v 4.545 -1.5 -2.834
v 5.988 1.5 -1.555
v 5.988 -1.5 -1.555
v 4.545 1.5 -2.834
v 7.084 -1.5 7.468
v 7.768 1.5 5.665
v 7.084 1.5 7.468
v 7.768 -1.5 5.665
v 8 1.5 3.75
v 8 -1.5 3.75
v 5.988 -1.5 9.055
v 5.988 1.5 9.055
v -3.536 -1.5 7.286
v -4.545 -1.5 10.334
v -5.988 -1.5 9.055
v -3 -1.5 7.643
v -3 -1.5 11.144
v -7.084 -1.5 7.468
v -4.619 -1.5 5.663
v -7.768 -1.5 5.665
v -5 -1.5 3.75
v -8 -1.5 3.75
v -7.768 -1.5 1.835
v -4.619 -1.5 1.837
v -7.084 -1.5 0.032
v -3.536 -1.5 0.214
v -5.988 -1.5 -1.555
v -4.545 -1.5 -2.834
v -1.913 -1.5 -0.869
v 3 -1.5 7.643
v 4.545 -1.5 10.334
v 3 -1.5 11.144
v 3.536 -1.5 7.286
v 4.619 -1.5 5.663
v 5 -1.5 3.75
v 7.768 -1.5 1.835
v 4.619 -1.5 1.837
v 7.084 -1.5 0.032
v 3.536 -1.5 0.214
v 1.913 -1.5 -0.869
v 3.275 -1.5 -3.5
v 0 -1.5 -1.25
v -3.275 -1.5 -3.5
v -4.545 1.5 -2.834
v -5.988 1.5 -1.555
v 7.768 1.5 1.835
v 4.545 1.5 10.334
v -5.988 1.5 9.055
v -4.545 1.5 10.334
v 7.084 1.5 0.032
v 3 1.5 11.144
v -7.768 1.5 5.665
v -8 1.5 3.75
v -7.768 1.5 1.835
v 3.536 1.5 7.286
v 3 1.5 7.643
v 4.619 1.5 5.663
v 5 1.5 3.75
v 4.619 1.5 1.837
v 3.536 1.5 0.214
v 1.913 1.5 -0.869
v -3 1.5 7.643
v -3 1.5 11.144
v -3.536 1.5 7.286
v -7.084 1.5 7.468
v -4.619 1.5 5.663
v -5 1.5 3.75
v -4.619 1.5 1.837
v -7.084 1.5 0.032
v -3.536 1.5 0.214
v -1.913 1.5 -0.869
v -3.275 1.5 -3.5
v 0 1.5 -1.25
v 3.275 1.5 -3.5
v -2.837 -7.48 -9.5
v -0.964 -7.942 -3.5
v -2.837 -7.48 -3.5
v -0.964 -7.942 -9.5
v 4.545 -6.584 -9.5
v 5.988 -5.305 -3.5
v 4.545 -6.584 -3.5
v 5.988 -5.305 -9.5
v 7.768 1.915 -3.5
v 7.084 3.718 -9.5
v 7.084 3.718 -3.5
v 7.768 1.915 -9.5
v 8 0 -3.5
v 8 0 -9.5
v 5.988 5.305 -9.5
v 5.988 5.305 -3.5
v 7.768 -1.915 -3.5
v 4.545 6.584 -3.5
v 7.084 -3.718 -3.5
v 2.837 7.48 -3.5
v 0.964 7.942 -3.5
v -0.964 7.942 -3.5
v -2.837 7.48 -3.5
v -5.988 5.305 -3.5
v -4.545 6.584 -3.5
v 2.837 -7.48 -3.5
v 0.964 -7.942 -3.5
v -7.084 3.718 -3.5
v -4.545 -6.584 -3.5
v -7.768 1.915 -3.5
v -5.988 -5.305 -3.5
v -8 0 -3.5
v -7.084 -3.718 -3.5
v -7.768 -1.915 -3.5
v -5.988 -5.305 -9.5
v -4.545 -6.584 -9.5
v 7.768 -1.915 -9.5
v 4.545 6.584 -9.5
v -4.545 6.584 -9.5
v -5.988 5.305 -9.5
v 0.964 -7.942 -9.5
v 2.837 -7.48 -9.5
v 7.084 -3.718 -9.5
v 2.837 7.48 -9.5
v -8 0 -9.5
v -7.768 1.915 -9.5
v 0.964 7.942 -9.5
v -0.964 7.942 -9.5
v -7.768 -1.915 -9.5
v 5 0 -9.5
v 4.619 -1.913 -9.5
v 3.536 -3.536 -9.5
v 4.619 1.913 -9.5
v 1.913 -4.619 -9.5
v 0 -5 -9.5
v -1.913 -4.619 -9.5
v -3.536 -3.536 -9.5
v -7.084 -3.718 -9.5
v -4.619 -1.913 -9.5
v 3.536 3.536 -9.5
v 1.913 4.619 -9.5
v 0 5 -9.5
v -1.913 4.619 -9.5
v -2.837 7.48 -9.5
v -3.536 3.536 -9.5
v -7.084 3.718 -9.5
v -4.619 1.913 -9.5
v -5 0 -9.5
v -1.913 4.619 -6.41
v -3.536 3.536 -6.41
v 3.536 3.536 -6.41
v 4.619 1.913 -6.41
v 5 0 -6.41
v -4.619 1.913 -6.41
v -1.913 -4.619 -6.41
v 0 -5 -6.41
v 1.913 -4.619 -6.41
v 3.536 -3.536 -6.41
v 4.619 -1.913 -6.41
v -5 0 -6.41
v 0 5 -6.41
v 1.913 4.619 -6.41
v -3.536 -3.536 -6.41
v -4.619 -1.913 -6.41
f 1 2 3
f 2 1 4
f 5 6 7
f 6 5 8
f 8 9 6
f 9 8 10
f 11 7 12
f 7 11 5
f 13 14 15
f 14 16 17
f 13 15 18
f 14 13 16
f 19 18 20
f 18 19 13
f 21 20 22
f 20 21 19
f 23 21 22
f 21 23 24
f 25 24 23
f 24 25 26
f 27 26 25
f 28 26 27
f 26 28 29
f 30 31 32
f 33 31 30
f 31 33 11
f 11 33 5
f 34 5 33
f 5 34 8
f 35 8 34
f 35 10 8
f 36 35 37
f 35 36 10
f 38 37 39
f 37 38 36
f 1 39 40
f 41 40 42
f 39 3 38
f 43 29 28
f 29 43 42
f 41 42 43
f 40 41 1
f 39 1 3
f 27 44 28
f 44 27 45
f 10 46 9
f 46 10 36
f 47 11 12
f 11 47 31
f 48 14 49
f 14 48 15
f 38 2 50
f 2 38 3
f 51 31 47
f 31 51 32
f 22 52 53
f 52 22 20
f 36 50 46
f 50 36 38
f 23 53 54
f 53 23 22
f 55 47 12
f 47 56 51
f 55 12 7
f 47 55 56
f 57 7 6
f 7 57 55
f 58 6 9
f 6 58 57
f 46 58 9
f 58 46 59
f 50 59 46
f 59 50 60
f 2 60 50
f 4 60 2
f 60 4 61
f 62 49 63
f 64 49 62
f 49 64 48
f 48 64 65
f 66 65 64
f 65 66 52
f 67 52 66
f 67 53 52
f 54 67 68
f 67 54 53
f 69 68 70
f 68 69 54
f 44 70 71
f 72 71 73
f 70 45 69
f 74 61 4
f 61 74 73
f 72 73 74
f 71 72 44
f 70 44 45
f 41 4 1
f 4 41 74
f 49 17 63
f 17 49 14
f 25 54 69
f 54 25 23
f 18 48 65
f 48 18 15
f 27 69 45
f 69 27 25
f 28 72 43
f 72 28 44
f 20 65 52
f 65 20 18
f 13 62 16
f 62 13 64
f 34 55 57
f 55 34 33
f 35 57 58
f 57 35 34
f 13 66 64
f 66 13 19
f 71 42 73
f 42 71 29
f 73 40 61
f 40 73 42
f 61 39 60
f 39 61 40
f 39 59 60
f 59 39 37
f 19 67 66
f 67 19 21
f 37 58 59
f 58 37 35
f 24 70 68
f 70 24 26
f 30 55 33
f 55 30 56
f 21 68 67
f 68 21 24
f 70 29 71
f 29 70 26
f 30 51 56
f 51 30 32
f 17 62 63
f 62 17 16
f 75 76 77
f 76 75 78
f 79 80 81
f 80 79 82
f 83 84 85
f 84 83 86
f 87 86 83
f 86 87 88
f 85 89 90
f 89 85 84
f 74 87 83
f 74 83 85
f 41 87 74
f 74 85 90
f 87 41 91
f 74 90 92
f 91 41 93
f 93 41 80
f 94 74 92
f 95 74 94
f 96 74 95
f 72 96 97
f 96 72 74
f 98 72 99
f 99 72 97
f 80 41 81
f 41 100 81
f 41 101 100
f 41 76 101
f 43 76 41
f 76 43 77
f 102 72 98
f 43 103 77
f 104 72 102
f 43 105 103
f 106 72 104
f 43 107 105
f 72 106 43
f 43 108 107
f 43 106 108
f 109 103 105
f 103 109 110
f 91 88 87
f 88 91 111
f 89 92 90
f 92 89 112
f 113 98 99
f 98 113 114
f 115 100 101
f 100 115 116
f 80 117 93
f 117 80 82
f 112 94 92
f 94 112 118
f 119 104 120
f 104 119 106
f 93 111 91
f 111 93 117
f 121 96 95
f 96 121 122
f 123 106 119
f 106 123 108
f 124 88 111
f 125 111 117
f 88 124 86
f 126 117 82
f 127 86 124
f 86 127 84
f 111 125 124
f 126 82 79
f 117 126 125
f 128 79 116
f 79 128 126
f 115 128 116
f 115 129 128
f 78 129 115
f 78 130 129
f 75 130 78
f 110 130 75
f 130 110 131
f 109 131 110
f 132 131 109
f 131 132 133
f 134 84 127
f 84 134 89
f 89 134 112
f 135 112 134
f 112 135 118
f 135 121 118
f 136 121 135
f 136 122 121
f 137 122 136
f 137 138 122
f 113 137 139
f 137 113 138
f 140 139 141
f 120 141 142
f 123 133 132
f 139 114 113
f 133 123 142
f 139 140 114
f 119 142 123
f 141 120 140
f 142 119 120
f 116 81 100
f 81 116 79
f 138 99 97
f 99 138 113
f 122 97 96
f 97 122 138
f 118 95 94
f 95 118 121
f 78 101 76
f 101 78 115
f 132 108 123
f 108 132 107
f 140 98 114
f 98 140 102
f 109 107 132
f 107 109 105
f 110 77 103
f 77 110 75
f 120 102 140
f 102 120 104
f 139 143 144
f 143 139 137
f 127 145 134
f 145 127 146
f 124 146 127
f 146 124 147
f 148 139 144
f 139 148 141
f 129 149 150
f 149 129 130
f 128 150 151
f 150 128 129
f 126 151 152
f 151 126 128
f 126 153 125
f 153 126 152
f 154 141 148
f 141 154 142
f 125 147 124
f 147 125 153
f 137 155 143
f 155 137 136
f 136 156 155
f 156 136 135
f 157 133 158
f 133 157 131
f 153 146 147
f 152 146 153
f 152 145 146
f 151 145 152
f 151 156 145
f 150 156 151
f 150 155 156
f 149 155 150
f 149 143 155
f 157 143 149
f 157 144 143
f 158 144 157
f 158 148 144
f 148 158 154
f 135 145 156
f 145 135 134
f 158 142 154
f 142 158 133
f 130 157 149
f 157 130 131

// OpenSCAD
magnetic_tube_holder();

module magnetic_tube_holder(
   wandstaerke          = 3,
   schlauch_durchmesser = 10,
   magnet_durchmesser   = 10,
   magnet_dicke         = 3
) {
    union() {
        translate([0, 0, (wandstaerke * 1.5 + magnet_dicke) / 2]) {
            schlauch_schelle(
                wandstaerke = wandstaerke,
                schlauch_durchmesser = schlauch_durchmesser
            );
            translate([
                0,
                0,
                (
                  schlauch_durchmesser
                  + wandstaerke * 2.5
                  + magnet_dicke
                ) / -2
            ]) {
                magnet_gehaeuse(
                    wandstaerke = wandstaerke,
                    magnet_durchmesser = magnet_durchmesser,
                    magnet_dicke       = magnet_dicke
                );
            }
        }
    }

    module schlauch_schelle(
       wandstaerke          = 1,
       schlauch_durchmesser = 5
    ) {
        difference() {
            rotate([90, 0, 0]) {
                difference() {
                    cylinder(
                        d = schlauch_durchmesser + wandstaerke * 2,
                        h = wandstaerke,
                        center = true
                    );
                    cylinder(
                        d = schlauch_durchmesser,
                        h = wandstaerke * 1.1,
                        center = true
                    );
                }
            }
            translate([
                0,
                0,
                wandstaerke
            ])
            cube([
                    schlauch_durchmesser * 0.6,
                    wandstaerke * 1.1,
                    schlauch_durchmesser
                ],
                center = true
            );
        }
    }

    module magnet_gehaeuse(
       wandstaerke          = 1,
       magnet_durchmesser   = 5,
       magnet_dicke         = 1
    ) {
        difference() {
            cylinder(
                h = magnet_dicke + wandstaerke,
                d = magnet_durchmesser + wandstaerke * 2,
                center = true
            );
            translate([0, 0, wandstaerke / -2 + 0.04]) {
                cylinder(h = magnet_dicke + 0.1, d = magnet_durchmesser, center = true);
            }
        }
    }
}
